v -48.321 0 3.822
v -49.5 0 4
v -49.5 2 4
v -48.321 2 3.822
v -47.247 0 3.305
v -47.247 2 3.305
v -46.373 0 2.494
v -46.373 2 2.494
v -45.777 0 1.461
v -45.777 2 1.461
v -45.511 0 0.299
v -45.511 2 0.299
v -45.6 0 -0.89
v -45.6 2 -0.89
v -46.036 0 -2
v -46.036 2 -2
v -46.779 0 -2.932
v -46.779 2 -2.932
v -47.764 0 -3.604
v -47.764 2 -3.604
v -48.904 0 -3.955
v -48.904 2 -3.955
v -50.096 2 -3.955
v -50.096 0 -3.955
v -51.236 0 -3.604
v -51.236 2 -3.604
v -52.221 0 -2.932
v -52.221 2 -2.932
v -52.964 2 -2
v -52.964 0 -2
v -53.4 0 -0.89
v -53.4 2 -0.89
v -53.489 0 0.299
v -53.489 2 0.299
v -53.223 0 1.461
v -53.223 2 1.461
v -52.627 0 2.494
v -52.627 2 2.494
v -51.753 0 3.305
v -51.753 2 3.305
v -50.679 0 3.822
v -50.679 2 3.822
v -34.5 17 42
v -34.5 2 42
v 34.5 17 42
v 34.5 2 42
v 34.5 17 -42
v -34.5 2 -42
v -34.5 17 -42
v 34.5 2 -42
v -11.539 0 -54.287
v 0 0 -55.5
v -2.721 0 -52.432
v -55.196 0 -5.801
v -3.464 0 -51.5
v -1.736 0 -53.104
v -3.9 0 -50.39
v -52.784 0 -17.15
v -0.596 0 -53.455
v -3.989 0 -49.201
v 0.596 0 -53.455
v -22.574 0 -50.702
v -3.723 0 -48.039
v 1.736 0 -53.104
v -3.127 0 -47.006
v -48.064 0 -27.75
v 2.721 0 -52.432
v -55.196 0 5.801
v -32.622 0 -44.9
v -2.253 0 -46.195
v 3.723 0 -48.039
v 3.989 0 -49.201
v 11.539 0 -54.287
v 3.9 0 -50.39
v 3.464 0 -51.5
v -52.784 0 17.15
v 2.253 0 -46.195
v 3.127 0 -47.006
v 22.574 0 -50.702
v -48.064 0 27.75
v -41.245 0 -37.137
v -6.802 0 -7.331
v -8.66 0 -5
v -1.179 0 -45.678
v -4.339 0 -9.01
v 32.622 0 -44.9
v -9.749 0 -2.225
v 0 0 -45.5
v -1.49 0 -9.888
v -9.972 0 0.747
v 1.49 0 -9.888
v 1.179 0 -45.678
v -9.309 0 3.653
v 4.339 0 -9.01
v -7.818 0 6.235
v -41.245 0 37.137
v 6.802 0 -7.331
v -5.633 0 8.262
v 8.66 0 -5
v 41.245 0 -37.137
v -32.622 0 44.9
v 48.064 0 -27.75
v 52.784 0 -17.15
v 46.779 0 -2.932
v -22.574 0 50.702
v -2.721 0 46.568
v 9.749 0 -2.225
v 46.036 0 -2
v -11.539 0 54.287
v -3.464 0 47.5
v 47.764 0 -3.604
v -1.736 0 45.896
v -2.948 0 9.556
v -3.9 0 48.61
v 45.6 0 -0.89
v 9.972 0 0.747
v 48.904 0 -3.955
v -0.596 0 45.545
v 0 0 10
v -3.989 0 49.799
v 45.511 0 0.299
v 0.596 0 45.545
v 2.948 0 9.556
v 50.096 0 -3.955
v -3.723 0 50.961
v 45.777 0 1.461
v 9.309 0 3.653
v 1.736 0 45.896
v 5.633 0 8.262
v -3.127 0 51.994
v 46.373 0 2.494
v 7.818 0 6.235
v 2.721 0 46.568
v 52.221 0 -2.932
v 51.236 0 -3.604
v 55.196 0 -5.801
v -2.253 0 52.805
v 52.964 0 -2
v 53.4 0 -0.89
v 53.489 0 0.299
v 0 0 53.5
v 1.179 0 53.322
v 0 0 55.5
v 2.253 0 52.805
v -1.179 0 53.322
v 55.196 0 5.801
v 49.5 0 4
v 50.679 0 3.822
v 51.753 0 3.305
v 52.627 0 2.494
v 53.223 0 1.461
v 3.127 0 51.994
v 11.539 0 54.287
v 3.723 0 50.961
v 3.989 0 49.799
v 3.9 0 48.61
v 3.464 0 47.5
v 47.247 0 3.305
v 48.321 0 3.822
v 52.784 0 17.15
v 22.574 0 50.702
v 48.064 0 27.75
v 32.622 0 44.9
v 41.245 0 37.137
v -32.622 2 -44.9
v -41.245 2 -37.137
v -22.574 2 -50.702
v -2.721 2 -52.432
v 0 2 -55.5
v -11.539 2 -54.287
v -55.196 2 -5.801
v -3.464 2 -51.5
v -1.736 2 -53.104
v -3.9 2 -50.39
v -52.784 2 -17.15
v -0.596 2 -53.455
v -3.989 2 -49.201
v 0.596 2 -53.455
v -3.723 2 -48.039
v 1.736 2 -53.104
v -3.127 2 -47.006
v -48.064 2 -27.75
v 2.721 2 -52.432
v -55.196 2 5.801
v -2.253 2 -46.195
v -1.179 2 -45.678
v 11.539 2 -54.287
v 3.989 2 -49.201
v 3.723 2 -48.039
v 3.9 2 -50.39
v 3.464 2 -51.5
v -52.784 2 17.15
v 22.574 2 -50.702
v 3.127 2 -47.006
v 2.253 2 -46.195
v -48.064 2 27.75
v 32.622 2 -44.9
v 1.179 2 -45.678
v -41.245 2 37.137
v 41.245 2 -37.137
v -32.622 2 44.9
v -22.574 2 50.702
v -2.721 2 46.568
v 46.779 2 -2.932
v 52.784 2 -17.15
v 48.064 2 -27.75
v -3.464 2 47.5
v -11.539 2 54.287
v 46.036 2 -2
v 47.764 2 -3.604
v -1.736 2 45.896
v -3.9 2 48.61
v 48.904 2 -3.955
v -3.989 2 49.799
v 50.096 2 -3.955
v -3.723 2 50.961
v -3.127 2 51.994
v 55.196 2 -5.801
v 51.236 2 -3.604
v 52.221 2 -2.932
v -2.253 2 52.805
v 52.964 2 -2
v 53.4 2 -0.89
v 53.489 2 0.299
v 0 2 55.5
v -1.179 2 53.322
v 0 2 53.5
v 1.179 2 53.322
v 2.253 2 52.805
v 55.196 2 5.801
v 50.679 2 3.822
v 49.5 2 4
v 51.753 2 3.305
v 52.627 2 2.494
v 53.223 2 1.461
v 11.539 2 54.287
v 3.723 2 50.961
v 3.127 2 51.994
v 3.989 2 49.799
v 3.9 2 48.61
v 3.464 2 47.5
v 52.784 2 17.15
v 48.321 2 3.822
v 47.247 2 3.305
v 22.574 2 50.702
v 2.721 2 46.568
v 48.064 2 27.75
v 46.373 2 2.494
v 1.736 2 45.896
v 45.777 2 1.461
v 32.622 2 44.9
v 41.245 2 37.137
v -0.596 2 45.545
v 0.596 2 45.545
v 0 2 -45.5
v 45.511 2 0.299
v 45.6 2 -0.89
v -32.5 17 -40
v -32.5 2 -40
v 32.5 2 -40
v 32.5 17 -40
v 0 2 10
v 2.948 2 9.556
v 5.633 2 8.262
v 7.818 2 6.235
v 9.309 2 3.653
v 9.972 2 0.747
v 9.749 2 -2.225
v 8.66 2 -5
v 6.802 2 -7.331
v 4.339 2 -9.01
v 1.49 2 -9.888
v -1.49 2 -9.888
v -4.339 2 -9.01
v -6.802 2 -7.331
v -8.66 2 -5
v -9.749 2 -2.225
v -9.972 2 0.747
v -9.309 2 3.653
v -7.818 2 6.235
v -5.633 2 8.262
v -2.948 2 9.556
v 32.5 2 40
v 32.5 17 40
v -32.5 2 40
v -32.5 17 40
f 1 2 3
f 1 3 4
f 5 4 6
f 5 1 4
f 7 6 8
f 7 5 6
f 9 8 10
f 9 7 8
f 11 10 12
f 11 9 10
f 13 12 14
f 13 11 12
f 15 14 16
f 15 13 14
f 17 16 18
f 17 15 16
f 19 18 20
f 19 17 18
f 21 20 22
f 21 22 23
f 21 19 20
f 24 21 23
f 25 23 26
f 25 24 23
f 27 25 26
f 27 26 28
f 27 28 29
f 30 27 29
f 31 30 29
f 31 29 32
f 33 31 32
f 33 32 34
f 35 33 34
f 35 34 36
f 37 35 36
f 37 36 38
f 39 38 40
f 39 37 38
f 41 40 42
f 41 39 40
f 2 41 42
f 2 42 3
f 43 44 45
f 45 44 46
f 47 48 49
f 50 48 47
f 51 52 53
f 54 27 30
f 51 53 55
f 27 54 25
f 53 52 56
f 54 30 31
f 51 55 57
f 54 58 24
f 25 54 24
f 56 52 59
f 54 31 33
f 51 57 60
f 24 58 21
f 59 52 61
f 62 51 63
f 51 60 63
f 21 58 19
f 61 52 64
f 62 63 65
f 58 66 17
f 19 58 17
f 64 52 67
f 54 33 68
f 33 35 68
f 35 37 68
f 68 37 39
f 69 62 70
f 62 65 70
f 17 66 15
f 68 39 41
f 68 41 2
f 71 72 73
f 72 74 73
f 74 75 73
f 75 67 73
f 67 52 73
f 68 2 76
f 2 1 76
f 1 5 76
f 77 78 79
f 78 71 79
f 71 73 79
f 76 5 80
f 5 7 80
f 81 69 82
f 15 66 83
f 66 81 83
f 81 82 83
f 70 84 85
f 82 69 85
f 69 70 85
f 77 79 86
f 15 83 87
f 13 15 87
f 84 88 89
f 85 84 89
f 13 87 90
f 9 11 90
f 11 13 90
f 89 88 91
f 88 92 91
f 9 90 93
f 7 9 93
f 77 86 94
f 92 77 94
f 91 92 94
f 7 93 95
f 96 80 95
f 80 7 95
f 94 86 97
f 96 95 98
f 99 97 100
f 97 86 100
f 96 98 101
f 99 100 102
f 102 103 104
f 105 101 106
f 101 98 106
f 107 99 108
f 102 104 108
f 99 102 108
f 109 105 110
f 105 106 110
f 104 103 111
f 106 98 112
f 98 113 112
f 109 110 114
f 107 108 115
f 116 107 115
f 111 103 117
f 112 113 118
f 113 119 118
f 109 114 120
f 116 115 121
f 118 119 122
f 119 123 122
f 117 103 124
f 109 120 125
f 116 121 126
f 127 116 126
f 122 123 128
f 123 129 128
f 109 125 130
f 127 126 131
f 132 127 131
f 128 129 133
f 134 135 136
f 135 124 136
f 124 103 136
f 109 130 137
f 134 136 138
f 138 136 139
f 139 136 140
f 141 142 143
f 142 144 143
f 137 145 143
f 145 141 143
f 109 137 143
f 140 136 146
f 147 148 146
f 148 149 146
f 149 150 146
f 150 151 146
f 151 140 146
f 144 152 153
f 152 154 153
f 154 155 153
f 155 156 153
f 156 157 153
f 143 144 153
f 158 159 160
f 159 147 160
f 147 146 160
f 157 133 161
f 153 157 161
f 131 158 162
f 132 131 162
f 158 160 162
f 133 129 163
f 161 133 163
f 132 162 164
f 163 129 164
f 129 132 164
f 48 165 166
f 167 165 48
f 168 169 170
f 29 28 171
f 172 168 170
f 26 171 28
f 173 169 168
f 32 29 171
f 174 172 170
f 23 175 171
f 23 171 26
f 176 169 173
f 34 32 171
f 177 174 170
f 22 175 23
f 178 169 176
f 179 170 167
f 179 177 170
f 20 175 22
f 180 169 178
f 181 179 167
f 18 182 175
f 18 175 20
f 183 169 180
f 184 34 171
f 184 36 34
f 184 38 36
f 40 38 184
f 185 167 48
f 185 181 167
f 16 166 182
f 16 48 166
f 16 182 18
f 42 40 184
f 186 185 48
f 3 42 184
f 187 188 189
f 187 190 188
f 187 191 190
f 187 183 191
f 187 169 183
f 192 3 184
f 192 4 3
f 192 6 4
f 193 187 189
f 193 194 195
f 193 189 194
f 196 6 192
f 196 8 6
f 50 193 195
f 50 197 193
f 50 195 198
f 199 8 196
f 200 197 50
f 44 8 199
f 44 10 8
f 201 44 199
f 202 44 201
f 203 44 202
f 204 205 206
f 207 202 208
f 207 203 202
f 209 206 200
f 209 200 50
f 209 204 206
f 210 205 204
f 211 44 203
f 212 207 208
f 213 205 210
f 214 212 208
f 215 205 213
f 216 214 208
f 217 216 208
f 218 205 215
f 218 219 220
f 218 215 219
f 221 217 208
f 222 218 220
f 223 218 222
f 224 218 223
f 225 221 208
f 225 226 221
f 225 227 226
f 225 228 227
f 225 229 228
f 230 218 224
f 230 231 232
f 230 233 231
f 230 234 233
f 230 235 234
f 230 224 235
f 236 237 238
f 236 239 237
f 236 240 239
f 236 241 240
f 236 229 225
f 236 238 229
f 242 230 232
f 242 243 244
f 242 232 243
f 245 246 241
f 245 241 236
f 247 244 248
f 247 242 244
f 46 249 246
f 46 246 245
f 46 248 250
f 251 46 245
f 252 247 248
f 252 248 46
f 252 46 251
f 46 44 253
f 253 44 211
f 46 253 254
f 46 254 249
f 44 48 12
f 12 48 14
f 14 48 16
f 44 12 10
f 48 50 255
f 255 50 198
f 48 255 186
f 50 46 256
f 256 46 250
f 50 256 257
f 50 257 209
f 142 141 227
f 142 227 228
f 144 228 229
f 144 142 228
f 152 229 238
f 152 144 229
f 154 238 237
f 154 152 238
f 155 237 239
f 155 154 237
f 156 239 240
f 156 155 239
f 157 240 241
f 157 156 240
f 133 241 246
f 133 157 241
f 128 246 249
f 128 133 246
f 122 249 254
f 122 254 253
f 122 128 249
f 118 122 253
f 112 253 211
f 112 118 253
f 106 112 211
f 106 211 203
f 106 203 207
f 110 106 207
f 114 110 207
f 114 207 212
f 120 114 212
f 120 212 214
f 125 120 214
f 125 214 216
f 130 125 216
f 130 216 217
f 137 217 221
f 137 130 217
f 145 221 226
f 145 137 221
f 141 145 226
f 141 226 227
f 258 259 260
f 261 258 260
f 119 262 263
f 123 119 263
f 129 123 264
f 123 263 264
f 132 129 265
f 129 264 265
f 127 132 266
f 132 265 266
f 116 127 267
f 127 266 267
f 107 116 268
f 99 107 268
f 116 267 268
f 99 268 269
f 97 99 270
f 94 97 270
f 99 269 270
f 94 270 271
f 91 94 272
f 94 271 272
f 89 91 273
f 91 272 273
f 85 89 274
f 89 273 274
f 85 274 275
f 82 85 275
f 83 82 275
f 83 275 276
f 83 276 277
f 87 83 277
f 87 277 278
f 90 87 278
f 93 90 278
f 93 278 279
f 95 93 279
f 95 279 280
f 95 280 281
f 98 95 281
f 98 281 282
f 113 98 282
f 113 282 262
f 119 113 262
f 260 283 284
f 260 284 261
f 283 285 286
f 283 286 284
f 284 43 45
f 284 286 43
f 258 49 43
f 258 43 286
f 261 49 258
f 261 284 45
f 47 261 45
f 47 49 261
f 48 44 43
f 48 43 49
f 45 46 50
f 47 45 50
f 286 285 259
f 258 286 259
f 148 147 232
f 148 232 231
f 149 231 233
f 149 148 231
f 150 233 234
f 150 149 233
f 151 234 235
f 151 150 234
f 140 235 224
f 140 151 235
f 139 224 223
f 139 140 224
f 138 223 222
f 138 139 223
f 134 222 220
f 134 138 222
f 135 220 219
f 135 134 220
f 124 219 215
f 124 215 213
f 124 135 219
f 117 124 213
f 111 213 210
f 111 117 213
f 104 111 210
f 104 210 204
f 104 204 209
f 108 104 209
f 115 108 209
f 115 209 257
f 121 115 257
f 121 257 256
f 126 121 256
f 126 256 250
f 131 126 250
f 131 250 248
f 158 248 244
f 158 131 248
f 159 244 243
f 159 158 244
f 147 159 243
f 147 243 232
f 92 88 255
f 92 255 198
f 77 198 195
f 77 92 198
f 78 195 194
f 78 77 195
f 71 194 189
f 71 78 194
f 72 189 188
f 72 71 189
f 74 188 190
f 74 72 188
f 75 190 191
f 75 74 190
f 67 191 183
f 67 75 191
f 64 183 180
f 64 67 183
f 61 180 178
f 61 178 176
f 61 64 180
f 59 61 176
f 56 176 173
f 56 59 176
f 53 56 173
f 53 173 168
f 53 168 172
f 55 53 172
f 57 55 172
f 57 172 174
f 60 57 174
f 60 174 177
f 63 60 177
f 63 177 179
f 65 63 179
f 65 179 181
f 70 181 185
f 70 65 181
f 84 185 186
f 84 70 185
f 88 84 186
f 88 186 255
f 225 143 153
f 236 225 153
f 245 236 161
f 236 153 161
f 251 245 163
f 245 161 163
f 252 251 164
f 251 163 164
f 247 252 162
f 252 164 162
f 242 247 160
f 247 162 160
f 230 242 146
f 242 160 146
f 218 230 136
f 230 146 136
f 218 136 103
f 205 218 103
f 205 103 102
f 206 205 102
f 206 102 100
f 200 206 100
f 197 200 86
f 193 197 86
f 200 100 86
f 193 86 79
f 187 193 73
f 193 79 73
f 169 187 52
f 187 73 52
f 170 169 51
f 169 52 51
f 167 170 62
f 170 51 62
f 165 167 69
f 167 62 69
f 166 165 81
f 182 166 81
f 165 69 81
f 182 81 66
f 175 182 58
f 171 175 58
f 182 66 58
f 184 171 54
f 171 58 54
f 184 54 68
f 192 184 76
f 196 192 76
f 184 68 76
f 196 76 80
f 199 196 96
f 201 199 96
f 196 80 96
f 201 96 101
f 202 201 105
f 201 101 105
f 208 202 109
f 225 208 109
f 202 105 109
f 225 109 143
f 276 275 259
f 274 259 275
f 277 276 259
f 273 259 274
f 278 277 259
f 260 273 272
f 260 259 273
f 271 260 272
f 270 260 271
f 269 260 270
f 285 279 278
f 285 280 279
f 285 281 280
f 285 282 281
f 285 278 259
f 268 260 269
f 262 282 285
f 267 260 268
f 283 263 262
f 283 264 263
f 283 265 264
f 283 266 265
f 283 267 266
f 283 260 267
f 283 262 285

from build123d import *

# Parameters (mm, degrees)
SKETCH1_R           = 55.5
SKETCH1_R_2         = 4
BOSS_EXTRUDE4_DEPTH = 2
SKETCH6_W           = 69
SKETCH6_H           = 84
SKETCH6_W_2         = 65
SKETCH6_H_2         = 80
BOSS_EXTRUDE5_DEPTH = 15
SKETCH7_R           = 10
CUT_EXTRUDE2_DEPTH  = 30


with BuildPart() as part:
    # Sketch1 → Boss-Extrude4 (new body)
    with BuildSketch(Plane(origin=(0, 0, 0), x_dir=(1, 0, 0), z_dir=(0, 1, 0))):
        with Locations(Location((0, 0, 0), (0, 0, 270))):
            Circle(SKETCH1_R)
        with Locations(Location((0, 49.5, 0), (0, 0, 270))):
            Circle(SKETCH1_R_2, mode=Mode.SUBTRACT)
        with Locations(Location((49.5, 0, 0), (0, 0, 270))):
            Circle(SKETCH1_R_2, mode=Mode.SUBTRACT)
        with Locations(Location((-49.5, 0, 0), (0, 0, 270))):
            Circle(SKETCH1_R_2, mode=Mode.SUBTRACT)
        with Locations(Location((0, -49.5, 0), (0, 0, 270))):
            Circle(SKETCH1_R_2, mode=Mode.SUBTRACT)
    extrude(amount=BOSS_EXTRUDE4_DEPTH)

    # Sketch6 → Boss-Extrude5 (add)
    with BuildSketch(Plane(origin=(0, 2, 0), x_dir=(1, 0, 0), z_dir=(0, 1, 0))):
        Rectangle(SKETCH6_W, SKETCH6_H)
        Rectangle(SKETCH6_W_2, SKETCH6_H_2, mode=Mode.SUBTRACT)
    extrude(amount=BOSS_EXTRUDE5_DEPTH)

    # Sketch7 → Cut-Extrude2 (cut)
    with BuildSketch(Plane(origin=(0, 2, 0), x_dir=(1, 0, 0), z_dir=(0, 1, 0))):
        with Locations(Location((0, 0, 0), (0, 0, 270))):
            Circle(SKETCH7_R)
    extrude(amount=-CUT_EXTRUDE2_DEPTH, mode=Mode.SUBTRACT)


solid = part.part
